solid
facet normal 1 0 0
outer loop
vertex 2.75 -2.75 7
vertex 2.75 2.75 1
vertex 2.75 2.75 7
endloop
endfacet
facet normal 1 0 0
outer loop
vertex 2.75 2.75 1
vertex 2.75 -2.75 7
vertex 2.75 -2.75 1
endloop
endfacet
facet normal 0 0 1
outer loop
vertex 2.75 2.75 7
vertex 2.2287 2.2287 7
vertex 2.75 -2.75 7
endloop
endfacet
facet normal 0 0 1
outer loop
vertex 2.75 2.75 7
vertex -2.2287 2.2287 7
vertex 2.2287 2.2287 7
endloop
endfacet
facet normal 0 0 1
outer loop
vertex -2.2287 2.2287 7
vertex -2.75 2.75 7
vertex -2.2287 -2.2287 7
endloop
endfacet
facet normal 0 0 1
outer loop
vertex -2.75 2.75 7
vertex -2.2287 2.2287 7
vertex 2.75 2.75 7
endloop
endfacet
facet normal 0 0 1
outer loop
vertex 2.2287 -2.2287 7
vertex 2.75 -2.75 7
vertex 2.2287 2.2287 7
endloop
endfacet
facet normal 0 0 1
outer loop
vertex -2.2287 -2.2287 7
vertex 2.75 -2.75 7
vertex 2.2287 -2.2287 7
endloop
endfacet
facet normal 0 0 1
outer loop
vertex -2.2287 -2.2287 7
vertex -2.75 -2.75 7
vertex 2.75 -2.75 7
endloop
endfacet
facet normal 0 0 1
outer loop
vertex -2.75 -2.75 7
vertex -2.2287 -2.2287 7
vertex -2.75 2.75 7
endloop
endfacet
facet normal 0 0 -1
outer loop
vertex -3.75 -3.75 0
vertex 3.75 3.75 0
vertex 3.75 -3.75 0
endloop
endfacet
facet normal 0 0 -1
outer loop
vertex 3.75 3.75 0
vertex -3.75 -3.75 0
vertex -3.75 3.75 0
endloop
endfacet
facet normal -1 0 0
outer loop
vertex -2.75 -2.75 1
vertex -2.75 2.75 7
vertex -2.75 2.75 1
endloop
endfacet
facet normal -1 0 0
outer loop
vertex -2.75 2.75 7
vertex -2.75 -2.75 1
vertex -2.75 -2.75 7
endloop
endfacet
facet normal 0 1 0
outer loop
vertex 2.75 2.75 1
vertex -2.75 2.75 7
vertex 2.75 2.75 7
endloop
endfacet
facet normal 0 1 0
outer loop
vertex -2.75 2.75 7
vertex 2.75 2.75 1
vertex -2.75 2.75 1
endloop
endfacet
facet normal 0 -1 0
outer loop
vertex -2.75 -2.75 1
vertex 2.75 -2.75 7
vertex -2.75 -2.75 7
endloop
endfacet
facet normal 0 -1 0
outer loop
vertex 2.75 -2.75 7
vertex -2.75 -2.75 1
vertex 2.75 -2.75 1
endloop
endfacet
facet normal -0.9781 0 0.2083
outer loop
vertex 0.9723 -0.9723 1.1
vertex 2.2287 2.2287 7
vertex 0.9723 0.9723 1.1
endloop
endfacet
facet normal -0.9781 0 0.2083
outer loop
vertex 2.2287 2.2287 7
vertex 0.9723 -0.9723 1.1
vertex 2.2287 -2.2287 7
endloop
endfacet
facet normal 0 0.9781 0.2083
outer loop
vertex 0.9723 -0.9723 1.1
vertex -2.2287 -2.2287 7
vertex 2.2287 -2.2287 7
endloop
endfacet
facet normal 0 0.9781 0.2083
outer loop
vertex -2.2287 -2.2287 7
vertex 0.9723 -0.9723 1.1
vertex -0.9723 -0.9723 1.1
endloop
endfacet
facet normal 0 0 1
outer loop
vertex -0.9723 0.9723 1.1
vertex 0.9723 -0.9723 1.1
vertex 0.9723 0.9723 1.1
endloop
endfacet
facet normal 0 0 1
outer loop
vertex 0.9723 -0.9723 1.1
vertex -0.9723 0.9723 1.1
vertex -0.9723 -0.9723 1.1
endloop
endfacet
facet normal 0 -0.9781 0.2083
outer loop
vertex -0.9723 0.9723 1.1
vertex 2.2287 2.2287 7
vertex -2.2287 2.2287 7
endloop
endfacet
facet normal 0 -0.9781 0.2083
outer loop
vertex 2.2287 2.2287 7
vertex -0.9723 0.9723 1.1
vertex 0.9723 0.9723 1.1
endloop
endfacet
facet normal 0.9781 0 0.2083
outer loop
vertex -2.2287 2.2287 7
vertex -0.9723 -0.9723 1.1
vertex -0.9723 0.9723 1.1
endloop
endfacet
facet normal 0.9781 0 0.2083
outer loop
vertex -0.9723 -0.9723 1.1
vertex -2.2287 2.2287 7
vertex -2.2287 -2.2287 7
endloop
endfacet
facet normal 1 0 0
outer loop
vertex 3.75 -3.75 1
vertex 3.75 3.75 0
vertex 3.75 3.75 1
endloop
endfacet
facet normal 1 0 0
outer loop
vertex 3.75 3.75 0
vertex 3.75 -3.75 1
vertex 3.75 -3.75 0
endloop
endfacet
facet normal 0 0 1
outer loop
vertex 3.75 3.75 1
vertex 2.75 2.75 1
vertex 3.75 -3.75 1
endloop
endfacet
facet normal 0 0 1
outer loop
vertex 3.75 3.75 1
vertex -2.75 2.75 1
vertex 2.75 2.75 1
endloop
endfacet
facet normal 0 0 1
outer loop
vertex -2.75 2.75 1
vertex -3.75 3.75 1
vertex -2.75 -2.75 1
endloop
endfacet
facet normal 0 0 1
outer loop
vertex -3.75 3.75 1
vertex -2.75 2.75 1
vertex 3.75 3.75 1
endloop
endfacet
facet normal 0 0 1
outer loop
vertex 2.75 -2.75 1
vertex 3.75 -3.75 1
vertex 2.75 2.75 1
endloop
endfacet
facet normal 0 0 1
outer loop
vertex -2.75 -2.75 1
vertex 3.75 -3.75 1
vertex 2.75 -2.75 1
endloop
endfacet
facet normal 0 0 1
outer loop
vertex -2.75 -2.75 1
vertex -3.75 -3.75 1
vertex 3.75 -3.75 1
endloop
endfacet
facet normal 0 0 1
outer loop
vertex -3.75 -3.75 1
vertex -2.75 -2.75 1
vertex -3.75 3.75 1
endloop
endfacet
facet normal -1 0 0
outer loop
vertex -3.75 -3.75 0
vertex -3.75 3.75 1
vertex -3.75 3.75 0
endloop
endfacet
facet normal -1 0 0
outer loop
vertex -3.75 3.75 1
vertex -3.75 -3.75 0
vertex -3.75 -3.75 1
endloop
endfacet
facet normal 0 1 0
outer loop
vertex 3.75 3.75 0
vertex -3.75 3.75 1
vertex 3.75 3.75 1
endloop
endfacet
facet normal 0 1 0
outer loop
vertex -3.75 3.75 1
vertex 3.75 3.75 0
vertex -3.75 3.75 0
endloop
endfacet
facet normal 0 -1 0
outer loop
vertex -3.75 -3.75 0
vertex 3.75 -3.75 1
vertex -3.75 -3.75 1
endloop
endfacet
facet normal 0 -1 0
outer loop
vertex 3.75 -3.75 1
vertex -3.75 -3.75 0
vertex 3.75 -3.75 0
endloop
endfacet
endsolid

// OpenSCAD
barwidth = 7.5;
barthickness = 1;
capheight = 6;

stemwidth = barwidth-2*barthickness;
stemthickness = 1;

//cylinder(r1=10,r2=5, h=20, $fn=4);

union() {
    // ground plate
    translate([-barwidth/2,-barwidth/2,0]) cube([barwidth,barwidth,barthickness]);
    // stem
    difference() {
        translate([-barwidth/2+barthickness,-barwidth/2+barthickness,0]) cube([stemwidth, stemwidth, capheight+barthickness]);
        translate([0,0,barthickness+0.1]) rotate([0,0,45]) cylinder(h=capheight, r1=stemwidth/4, r2=sqrt(2)*(stemwidth-barthickness)/2, $fn=4);
    }
}
